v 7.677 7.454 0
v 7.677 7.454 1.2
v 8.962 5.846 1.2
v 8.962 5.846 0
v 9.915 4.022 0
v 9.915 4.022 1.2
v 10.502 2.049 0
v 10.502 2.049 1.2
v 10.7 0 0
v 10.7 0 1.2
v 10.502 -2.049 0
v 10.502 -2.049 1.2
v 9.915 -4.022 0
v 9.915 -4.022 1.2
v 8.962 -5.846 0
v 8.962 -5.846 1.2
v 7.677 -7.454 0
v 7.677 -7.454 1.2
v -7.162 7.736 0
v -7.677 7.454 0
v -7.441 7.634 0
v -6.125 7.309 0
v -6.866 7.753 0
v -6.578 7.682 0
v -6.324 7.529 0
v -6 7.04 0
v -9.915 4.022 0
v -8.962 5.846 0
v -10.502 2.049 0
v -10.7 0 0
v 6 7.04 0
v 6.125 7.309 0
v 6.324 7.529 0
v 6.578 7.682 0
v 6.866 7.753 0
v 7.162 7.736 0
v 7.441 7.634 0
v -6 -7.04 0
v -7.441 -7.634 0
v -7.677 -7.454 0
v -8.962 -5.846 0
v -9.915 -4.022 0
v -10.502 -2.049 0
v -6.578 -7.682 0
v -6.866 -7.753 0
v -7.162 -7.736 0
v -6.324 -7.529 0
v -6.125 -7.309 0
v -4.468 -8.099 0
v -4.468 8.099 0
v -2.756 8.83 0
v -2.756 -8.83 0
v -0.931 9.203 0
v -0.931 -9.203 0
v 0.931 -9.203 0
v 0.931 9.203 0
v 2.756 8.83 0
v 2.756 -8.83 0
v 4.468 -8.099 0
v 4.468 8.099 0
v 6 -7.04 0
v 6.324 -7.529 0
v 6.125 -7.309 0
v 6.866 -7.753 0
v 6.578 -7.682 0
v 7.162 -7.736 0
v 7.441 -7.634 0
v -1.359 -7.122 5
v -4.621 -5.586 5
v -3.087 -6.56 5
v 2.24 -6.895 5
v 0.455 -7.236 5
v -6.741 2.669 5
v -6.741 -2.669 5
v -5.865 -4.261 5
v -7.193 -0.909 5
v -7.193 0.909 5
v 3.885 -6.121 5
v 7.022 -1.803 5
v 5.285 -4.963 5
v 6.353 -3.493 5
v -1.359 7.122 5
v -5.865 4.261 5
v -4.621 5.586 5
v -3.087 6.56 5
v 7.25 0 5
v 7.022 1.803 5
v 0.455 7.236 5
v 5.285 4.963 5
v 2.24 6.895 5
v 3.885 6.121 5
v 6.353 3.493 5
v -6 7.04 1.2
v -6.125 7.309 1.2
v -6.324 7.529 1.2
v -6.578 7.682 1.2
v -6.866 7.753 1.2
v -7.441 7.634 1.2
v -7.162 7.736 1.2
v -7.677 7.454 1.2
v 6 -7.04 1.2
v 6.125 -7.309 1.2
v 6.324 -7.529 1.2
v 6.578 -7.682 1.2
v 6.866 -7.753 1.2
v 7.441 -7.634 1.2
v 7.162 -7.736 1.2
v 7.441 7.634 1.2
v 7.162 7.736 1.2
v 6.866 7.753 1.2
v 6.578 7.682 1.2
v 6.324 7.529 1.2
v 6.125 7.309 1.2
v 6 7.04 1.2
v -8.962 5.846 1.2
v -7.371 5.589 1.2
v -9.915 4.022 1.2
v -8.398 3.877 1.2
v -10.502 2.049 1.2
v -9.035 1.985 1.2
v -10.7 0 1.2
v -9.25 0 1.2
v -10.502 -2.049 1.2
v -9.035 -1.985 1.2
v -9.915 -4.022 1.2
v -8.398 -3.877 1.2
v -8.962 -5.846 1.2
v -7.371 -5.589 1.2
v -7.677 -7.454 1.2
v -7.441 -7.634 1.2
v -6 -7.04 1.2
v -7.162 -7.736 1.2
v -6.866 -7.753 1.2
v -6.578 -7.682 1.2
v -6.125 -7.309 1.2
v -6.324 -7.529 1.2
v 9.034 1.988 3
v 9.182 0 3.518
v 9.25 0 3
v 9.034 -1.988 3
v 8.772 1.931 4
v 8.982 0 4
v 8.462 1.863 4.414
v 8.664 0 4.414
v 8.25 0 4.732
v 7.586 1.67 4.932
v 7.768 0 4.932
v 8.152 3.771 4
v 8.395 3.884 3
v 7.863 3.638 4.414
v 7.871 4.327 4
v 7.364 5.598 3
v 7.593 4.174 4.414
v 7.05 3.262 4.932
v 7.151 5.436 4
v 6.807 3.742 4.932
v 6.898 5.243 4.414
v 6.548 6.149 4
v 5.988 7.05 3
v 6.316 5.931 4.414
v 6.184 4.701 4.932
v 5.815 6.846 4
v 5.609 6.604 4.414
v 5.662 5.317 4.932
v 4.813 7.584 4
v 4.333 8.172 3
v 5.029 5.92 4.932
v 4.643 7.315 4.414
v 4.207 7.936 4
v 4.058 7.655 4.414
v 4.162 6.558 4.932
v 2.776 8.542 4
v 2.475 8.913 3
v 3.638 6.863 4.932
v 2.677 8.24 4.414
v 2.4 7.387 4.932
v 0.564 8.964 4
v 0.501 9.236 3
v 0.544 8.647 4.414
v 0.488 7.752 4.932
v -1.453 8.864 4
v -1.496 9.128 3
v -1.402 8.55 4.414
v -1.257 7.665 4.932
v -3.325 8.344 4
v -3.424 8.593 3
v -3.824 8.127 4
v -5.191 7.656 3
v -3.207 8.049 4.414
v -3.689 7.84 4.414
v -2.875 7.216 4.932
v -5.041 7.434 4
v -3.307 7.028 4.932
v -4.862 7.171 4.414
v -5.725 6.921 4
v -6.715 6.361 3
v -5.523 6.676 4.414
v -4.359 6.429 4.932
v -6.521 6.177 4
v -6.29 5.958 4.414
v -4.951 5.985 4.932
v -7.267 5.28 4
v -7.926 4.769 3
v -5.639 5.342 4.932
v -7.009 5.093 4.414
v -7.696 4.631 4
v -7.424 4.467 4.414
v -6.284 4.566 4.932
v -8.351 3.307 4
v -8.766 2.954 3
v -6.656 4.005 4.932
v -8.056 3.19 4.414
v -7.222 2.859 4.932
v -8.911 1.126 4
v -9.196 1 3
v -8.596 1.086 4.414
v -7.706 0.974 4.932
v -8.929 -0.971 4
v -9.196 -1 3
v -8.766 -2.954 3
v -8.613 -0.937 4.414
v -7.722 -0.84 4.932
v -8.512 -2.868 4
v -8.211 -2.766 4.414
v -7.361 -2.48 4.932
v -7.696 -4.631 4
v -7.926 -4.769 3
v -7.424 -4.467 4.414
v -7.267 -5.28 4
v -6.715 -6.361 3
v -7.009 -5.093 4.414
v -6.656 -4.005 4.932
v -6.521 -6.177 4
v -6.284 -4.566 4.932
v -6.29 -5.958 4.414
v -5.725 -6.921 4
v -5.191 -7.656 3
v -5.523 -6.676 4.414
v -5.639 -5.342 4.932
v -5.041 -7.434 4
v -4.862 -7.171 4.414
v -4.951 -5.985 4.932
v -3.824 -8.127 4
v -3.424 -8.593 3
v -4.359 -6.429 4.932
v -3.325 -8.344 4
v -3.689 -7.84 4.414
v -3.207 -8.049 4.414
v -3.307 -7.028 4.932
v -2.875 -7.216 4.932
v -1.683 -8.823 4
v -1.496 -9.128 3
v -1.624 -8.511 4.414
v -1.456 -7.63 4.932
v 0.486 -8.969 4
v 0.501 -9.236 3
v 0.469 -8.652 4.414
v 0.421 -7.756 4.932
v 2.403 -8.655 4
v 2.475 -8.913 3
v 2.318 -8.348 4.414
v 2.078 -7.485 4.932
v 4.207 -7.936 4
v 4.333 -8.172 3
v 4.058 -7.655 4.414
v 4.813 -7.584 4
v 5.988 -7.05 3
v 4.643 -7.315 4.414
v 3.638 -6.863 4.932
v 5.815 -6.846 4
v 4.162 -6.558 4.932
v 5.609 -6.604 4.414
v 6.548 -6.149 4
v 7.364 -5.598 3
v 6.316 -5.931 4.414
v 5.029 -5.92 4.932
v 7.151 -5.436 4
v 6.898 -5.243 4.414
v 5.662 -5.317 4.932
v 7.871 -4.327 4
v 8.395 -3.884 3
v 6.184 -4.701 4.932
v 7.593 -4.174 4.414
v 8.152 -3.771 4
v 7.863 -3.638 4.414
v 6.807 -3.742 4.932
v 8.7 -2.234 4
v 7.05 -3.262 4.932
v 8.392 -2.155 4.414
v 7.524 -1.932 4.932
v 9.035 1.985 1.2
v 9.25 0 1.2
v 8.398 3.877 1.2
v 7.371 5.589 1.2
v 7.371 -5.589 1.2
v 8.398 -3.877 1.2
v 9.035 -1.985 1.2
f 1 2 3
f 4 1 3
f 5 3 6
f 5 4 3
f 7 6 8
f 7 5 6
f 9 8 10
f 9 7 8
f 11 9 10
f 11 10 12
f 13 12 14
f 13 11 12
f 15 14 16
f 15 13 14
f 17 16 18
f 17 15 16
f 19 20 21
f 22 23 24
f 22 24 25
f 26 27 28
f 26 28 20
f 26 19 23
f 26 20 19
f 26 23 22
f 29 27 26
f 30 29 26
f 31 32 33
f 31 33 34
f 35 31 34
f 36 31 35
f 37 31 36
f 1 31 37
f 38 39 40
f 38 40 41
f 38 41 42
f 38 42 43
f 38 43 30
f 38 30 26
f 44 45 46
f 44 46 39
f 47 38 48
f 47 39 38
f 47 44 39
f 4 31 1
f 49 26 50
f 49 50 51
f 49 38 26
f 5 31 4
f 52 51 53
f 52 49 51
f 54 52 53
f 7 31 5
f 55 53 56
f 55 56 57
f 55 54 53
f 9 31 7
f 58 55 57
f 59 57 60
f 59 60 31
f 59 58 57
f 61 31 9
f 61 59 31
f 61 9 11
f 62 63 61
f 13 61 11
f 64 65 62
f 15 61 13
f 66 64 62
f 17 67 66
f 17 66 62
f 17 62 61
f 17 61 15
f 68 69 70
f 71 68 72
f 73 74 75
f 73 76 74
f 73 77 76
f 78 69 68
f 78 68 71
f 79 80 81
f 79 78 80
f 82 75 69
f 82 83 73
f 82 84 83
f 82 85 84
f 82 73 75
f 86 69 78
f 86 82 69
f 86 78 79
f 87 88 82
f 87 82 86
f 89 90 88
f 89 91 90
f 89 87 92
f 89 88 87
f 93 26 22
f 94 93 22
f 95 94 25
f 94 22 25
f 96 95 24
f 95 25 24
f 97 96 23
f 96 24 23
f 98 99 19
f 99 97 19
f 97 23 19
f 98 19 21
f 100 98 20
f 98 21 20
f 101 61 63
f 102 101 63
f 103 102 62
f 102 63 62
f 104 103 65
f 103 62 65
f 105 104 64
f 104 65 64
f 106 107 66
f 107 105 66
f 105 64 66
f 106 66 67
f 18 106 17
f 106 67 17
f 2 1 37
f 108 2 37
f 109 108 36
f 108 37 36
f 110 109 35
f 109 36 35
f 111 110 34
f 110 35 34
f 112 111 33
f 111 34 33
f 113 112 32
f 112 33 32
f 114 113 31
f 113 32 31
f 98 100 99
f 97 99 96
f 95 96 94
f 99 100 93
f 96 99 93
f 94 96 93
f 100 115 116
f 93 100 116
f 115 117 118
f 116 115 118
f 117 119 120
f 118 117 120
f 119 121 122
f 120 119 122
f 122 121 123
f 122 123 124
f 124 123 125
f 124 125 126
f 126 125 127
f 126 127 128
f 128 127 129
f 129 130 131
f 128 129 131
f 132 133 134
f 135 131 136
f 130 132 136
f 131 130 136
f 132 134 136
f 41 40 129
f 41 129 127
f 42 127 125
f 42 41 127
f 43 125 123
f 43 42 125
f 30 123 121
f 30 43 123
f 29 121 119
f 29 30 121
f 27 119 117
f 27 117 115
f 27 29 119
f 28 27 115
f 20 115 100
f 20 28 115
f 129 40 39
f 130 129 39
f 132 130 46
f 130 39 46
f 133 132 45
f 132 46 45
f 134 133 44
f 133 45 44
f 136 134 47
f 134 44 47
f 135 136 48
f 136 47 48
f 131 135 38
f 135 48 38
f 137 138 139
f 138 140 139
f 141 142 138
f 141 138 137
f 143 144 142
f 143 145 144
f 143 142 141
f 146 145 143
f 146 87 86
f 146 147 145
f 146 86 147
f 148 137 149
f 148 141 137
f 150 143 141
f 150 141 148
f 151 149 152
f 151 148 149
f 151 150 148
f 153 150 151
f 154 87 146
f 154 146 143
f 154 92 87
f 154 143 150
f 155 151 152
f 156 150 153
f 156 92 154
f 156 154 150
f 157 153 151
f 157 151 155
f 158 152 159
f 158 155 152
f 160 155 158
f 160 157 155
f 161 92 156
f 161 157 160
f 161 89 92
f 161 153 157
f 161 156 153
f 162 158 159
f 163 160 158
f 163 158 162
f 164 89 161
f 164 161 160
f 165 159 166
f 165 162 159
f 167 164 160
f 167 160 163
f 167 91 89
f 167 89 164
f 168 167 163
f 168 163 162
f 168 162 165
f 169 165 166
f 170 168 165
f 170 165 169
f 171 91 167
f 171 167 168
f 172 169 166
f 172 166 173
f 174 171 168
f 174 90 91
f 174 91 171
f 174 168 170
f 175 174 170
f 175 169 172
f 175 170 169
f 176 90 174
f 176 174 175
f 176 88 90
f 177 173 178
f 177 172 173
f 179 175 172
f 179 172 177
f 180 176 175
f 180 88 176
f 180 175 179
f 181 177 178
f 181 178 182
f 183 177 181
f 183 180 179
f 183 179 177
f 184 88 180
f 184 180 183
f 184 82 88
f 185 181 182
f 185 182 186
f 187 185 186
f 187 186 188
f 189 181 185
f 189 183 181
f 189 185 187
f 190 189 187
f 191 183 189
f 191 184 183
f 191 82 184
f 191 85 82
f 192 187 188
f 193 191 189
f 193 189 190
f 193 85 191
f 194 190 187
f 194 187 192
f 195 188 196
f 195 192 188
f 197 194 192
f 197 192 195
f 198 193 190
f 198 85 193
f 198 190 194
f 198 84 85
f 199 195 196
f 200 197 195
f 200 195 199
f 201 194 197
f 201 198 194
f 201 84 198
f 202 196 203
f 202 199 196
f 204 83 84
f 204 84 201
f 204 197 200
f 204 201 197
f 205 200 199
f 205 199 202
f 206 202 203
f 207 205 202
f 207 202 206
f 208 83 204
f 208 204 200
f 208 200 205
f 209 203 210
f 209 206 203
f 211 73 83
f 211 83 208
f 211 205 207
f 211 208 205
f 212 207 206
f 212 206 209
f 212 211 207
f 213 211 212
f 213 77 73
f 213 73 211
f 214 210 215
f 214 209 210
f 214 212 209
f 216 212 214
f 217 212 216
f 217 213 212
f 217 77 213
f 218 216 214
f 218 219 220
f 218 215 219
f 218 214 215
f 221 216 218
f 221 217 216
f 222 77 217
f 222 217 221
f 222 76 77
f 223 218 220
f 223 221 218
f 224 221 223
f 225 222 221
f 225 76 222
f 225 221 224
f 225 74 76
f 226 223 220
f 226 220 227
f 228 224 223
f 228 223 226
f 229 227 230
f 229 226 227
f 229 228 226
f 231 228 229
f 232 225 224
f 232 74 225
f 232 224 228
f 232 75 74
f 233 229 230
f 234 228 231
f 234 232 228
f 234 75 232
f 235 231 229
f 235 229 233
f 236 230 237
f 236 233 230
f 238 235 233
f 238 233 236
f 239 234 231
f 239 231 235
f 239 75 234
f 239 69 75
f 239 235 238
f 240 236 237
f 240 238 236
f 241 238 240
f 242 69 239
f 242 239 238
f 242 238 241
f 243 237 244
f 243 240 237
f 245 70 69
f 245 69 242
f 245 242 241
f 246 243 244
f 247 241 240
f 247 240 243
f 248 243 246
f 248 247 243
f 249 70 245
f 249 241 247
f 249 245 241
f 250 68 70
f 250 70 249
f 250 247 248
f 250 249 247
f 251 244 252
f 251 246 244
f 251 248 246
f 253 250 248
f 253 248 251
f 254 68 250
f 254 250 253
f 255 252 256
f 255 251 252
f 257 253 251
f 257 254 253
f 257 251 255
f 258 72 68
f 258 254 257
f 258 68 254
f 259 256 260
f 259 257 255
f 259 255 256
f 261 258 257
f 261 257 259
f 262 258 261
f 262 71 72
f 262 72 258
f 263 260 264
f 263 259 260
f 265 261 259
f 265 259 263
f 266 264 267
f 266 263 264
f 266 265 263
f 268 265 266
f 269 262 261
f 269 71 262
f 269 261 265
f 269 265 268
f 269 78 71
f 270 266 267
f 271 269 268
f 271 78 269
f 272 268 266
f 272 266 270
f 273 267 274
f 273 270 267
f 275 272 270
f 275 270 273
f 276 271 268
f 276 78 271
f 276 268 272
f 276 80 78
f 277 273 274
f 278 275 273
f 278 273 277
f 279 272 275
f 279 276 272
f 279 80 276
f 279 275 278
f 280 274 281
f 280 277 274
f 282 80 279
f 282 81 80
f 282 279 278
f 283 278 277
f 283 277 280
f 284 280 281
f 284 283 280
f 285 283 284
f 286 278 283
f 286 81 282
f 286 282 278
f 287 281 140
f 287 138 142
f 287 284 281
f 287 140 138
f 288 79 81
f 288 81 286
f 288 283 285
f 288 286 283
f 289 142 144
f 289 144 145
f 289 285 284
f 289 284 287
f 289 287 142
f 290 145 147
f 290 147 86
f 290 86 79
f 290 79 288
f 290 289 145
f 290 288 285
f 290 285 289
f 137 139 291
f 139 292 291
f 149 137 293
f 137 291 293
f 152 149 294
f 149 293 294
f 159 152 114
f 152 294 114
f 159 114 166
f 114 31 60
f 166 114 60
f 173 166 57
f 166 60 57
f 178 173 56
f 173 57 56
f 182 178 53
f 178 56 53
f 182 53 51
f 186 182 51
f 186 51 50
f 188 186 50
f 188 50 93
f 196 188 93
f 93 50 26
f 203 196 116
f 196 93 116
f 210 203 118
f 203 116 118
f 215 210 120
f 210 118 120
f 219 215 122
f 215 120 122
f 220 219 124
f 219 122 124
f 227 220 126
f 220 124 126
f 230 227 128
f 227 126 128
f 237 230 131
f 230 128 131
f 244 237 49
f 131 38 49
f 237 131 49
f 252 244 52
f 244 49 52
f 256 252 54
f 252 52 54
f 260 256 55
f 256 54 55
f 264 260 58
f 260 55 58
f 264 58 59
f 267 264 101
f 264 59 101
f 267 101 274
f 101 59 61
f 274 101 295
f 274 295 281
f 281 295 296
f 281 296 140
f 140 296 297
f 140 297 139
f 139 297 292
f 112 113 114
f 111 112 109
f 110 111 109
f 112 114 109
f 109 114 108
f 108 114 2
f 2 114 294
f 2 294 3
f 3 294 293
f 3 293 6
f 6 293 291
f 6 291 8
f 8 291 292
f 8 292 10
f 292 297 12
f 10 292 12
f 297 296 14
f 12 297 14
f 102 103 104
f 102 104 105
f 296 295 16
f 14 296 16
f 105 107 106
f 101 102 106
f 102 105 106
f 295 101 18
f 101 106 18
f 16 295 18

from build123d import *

# Parameters (mm, degrees)
F0_R        = 9.25
F1_DEPTH    = 5
F3_DEPTH    = 1.2
F4_T1_DEPTH = 12.1393431135
F5_R        = 2


# Not quite as in the source:
# - a fillet or chamfer that OpenCascade refuses, or shapes differently, is made with other operations: its cross-section is extruded or revolved along the edge and cut away or added


with BuildPart() as f1:
    # F0 (on Top) → F1 (new body)
    with BuildSketch(Plane.XY):
        Circle(F0_R)
    extrude(amount=F1_DEPTH)

    # F2 (on face) → F3 (join)
    with BuildSketch(Plane(origin=(0, 0, 0), x_dir=(1, 0, 0), z_dir=(0, 0, -1))):
        with BuildLine():
            Line((-6, 7.0400639202), (-6, 8.8594582227))
            ThreePointArc((-6, 8.8594582227), (-10.7, 0), (-6, -8.8594582227))
            Line((-6, -8.8594582227), (-6, -7.0400639202))
            ThreePointArc((-6, -7.0400639202), (-9.25, 0), (-6, 7.0400639202))
        make_face()
        with BuildLine():
            Line((-6, -7.0400639202), (-6, 7.0400639202))
            ThreePointArc((-6, 7.0400639202), (-9.25, 0), (-6, -7.0400639202))
        make_face()
        with BuildLine():
            Line((6, -7.0400639202), (6, 7.0400639202))
            ThreePointArc((6, 7.0400639202), (0, 9.25), (-6, 7.0400639202))
            Line((-6, 7.0400639202), (-6, -7.0400639202))
            ThreePointArc((-6, -7.0400639202), (0, -9.25), (6, -7.0400639202))
        make_face()
        with BuildLine():
            ThreePointArc((9.25, 0), (8.3982885161, 3.8770156048), (6, 7.0400639202))
            Line((6, 7.0400639202), (6, -7.0400639202))
            ThreePointArc((6, -7.0400639202), (8.3982885161, -3.8770156048), (9.25, 0))
        make_face()
        with BuildLine():
            ThreePointArc((6, -8.8594582227), (9.4522484098, -5.0144790358), (10.7, 0))
            ThreePointArc((10.7, 0), (9.4522484098, 5.0144790358), (6, 8.8594582227))
            Line((6, 8.8594582227), (6, 7.0400639202))
            ThreePointArc((6, 7.0400639202), (8.3982885161, 3.8770156048), (9.25, 0))
            ThreePointArc((9.25, 0), (8.3982885161, -3.8770156048), (6, -7.0400639202))
            Line((6, -7.0400639202), (6, -8.8594582227))
        make_face()
    extrude(amount=-F3_DEPTH)

    # F4: fillet of radius 1 on 4 edges, made by hand

    # F4_s2 → F4_t1 (cut)
    with BuildSketch(Plane.XY.offset(-5.4696715568)):
        with BuildLine():
            ThreePointArc((6, -7.0400639202), (6.7195608847, -7.728089766), (7.6766055002, -7.4538398154))
            ThreePointArc((7.6766055002, -7.4538398154), (6.8743236234, -8.1996143032), (6, -8.8594582227))
            Line((6, -8.8594582227), (6, -7.0400639202))
        make_face()
        with BuildLine():
            ThreePointArc((-7.6766055002, -7.4538398154), (-6.7195608847, -7.728089766), (-6, -7.0400639202))
            Line((-6, -7.0400639202), (-6, -8.8594582227))
            ThreePointArc((-6, -8.8594582227), (-6.8743236234, -8.1996143032), (-7.6766055002, -7.4538398154))
        make_face()
        with BuildLine():
            ThreePointArc((7.6766055002, 7.4538398154), (6.7195608847, 7.728089766), (6, 7.0400639202))
            Line((6, 7.0400639202), (6, 8.8594582227))
            ThreePointArc((6, 8.8594582227), (6.8743236234, 8.1996143032), (7.6766055002, 7.4538398154))
        make_face()
        with BuildLine():
            ThreePointArc((-6, 7.0400639202), (-6.7195608847, 7.728089766), (-7.6766055002, 7.4538398154))
            ThreePointArc((-7.6766055002, 7.4538398154), (-6.8743236234, 8.1996143032), (-6, 8.8594582227))
            Line((-6, 8.8594582227), (-6, 7.0400639202))
        make_face()
    extrude(amount=F4_T1_DEPTH, mode=Mode.SUBTRACT)

    # F5
    f5_edges = [f1.edges().sort_by_distance(p)[0] for p in [
        (-9.25, 0, 5),
    ]]
    fillet(f5_edges, radius=F5_R)


solid = f1.part
